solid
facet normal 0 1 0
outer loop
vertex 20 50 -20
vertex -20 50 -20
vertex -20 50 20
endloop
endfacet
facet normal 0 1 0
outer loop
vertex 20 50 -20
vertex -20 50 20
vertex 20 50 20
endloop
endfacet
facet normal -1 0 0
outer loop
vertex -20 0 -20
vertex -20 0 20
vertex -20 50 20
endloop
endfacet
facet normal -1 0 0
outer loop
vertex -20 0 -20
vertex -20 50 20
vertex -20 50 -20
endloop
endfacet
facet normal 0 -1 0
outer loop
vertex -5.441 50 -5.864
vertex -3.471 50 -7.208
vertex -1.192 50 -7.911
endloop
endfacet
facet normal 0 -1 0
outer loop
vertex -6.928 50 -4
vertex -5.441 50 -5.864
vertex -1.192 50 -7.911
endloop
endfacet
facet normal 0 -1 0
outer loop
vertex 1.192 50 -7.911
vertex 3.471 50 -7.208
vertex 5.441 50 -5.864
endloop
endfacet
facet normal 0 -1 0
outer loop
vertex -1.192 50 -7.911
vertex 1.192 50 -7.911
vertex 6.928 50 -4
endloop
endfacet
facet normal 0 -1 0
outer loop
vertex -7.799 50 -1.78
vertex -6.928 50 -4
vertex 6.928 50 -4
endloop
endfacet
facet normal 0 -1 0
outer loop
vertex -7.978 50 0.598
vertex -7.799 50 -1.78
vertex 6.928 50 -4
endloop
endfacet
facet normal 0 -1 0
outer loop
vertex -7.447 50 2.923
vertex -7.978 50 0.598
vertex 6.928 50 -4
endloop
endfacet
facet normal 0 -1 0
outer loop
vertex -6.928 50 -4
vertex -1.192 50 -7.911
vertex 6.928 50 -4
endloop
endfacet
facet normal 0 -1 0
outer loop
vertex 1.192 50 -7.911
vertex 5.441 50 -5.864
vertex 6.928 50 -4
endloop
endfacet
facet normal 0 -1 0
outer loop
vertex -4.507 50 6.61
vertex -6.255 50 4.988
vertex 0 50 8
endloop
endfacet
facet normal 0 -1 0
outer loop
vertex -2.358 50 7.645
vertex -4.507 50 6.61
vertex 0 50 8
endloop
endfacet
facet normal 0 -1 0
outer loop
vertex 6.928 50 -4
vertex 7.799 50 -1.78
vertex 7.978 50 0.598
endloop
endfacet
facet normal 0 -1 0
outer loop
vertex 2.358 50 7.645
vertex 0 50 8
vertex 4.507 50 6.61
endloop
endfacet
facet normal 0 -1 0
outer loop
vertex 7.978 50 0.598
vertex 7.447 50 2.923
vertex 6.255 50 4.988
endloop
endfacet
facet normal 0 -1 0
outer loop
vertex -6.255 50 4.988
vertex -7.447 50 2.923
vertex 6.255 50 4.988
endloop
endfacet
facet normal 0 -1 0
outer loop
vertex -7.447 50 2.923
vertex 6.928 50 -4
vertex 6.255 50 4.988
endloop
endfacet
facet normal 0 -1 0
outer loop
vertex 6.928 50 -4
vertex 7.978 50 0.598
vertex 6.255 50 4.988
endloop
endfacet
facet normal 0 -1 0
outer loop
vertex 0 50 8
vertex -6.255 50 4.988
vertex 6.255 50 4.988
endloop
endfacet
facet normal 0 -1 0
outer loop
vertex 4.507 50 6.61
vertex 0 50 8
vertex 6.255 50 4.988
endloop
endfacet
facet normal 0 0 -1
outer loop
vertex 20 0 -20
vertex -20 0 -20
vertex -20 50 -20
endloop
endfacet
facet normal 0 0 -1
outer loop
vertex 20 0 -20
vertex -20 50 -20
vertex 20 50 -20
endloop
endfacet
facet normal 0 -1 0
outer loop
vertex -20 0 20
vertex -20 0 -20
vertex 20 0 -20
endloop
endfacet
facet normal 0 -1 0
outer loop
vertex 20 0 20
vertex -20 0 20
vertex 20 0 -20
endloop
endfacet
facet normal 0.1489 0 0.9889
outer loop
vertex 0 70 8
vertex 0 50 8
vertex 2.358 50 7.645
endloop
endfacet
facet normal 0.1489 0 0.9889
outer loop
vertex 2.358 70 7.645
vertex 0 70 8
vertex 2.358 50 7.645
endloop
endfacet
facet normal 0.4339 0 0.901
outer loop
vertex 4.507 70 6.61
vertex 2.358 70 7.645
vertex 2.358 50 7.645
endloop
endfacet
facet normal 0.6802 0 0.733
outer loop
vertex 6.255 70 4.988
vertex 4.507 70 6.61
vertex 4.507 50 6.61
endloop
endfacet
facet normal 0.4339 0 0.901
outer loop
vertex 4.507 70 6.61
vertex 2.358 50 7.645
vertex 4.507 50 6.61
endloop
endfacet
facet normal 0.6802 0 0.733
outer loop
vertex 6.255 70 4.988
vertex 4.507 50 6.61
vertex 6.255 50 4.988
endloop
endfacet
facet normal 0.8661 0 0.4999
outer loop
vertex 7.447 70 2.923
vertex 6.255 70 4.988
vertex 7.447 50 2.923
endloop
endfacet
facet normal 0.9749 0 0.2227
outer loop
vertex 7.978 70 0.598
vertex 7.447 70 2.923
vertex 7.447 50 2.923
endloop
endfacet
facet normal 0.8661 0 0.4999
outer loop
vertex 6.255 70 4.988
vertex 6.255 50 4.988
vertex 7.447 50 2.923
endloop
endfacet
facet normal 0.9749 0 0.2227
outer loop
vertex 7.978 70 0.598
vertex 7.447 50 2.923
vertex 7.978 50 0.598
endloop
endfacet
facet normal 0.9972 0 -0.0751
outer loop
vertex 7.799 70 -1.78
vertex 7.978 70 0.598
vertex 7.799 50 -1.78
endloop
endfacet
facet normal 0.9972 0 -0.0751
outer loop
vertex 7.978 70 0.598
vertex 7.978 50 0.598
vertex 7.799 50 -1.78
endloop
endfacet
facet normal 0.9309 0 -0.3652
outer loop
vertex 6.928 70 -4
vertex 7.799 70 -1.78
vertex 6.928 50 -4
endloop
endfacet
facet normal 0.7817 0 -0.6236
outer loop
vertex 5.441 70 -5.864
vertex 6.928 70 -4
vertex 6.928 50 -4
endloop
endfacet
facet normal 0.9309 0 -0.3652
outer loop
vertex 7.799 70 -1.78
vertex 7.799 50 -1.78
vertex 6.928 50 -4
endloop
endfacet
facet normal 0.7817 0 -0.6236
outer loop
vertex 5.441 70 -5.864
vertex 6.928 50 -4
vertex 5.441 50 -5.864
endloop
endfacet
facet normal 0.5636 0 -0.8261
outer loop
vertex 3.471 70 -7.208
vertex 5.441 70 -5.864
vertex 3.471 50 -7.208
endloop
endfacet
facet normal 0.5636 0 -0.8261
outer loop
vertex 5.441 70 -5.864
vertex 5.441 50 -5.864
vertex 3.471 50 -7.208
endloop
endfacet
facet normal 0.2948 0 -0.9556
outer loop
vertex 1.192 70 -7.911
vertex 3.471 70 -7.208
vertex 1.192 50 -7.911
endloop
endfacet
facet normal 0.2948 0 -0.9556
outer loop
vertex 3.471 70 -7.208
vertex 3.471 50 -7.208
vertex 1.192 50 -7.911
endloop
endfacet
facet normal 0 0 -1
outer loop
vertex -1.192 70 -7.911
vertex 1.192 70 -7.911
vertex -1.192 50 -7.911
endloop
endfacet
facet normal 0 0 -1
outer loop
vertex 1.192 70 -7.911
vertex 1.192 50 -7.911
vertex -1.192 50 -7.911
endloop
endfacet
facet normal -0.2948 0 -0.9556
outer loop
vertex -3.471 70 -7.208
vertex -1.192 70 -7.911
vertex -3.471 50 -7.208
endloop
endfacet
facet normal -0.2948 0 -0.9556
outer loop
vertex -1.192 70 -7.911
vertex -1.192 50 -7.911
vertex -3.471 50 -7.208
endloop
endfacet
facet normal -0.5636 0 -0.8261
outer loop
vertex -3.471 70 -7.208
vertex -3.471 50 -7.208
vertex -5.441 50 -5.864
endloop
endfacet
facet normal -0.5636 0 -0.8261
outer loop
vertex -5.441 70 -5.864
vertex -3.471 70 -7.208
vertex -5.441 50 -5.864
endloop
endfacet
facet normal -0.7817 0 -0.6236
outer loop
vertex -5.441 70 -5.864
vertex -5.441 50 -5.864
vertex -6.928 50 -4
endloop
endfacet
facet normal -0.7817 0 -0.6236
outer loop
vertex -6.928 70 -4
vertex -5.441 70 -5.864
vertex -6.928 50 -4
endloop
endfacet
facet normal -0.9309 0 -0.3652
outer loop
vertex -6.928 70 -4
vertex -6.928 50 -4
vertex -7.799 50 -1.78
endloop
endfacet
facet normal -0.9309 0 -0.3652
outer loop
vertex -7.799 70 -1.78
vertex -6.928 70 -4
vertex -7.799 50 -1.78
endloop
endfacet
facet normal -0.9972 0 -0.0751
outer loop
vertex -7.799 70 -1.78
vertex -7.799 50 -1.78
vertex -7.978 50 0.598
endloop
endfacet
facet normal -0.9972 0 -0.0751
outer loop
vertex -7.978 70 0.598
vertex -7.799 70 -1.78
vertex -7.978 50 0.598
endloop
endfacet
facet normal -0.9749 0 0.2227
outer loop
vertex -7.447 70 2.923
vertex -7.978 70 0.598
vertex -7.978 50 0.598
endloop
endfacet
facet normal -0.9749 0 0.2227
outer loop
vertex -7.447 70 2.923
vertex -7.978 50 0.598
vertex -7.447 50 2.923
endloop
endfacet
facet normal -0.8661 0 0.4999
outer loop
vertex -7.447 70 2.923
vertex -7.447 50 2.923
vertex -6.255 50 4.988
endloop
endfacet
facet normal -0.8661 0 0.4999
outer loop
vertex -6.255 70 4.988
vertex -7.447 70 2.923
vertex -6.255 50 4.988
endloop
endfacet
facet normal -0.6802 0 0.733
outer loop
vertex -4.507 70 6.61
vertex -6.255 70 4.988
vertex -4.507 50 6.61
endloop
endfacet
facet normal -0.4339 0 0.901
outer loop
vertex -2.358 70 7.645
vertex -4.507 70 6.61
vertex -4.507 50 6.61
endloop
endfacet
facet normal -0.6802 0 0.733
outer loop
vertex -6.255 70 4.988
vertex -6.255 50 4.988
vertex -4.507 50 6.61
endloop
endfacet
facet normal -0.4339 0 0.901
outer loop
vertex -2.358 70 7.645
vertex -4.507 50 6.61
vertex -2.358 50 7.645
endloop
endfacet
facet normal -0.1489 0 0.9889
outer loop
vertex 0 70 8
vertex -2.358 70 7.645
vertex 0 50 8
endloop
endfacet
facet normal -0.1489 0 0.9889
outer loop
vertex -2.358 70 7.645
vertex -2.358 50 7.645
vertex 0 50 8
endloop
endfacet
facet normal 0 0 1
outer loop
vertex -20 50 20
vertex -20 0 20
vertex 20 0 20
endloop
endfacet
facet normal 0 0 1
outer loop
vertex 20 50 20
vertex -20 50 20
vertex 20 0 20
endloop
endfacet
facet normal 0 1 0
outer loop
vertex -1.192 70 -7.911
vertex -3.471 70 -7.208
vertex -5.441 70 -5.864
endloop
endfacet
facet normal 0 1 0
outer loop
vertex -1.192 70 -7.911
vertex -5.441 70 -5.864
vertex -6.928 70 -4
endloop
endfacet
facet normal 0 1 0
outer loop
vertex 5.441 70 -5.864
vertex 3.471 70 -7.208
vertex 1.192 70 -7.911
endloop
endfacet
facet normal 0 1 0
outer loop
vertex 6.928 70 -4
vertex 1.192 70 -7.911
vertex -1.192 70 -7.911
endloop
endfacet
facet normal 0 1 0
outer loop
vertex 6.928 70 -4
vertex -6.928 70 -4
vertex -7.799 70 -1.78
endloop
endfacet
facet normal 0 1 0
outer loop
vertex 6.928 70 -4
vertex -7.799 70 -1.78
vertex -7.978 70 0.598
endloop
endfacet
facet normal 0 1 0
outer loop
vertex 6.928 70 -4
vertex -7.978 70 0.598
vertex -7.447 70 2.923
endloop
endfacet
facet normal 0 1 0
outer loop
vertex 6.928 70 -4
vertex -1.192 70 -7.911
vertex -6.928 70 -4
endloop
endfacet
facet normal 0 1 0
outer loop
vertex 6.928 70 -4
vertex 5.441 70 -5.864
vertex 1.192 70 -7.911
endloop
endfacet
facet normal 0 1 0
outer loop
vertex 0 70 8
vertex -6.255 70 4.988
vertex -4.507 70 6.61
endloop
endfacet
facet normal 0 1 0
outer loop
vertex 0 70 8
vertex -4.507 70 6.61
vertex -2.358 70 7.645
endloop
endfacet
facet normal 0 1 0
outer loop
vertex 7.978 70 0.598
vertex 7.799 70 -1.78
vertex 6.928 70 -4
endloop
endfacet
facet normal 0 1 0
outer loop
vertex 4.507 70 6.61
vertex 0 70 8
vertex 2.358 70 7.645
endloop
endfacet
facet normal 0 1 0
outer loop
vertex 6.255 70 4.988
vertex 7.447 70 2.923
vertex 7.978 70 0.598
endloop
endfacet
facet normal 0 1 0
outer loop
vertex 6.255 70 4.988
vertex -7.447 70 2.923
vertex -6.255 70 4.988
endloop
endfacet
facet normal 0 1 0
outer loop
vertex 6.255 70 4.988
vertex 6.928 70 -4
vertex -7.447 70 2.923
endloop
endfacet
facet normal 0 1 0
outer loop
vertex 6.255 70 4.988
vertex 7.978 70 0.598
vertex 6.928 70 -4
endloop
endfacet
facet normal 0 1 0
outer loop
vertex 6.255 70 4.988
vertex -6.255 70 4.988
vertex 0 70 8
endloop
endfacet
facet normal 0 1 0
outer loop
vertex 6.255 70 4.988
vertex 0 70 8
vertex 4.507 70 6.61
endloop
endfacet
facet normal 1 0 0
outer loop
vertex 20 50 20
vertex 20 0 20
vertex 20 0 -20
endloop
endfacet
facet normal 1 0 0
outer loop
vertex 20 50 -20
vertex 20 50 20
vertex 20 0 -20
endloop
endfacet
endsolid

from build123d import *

# Parameters (mm, degrees)
SKETCH_1_W      = 40
SKETCH_1_H      = 40
EXTRUDE_1_DEPTH = 50
SKETCH_2_R      = 8
EXTRUDE_2_DEPTH = 20


with BuildPart() as part:
    # 草图1 → 凸台-拉伸1 (new body)
    with BuildSketch(Plane(origin=(0, 0, 0), x_dir=(1, 0, 0), z_dir=(0, 1, 0))):
        Rectangle(SKETCH_1_W, SKETCH_1_H)
    extrude(amount=EXTRUDE_1_DEPTH)


with BuildPart() as body_2:
    # 草图2 → 凸台-拉伸2 (new body)
    with BuildSketch(Plane(origin=(0, 50, 0), x_dir=(1, 0, 0), z_dir=(0, 1, 0))):
        with Locations(Location((0, 0, 0), (0, 0, 270))):
            Circle(SKETCH_2_R)
    extrude(amount=EXTRUDE_2_DEPTH)


solid = Compound([part.part, body_2.part])
